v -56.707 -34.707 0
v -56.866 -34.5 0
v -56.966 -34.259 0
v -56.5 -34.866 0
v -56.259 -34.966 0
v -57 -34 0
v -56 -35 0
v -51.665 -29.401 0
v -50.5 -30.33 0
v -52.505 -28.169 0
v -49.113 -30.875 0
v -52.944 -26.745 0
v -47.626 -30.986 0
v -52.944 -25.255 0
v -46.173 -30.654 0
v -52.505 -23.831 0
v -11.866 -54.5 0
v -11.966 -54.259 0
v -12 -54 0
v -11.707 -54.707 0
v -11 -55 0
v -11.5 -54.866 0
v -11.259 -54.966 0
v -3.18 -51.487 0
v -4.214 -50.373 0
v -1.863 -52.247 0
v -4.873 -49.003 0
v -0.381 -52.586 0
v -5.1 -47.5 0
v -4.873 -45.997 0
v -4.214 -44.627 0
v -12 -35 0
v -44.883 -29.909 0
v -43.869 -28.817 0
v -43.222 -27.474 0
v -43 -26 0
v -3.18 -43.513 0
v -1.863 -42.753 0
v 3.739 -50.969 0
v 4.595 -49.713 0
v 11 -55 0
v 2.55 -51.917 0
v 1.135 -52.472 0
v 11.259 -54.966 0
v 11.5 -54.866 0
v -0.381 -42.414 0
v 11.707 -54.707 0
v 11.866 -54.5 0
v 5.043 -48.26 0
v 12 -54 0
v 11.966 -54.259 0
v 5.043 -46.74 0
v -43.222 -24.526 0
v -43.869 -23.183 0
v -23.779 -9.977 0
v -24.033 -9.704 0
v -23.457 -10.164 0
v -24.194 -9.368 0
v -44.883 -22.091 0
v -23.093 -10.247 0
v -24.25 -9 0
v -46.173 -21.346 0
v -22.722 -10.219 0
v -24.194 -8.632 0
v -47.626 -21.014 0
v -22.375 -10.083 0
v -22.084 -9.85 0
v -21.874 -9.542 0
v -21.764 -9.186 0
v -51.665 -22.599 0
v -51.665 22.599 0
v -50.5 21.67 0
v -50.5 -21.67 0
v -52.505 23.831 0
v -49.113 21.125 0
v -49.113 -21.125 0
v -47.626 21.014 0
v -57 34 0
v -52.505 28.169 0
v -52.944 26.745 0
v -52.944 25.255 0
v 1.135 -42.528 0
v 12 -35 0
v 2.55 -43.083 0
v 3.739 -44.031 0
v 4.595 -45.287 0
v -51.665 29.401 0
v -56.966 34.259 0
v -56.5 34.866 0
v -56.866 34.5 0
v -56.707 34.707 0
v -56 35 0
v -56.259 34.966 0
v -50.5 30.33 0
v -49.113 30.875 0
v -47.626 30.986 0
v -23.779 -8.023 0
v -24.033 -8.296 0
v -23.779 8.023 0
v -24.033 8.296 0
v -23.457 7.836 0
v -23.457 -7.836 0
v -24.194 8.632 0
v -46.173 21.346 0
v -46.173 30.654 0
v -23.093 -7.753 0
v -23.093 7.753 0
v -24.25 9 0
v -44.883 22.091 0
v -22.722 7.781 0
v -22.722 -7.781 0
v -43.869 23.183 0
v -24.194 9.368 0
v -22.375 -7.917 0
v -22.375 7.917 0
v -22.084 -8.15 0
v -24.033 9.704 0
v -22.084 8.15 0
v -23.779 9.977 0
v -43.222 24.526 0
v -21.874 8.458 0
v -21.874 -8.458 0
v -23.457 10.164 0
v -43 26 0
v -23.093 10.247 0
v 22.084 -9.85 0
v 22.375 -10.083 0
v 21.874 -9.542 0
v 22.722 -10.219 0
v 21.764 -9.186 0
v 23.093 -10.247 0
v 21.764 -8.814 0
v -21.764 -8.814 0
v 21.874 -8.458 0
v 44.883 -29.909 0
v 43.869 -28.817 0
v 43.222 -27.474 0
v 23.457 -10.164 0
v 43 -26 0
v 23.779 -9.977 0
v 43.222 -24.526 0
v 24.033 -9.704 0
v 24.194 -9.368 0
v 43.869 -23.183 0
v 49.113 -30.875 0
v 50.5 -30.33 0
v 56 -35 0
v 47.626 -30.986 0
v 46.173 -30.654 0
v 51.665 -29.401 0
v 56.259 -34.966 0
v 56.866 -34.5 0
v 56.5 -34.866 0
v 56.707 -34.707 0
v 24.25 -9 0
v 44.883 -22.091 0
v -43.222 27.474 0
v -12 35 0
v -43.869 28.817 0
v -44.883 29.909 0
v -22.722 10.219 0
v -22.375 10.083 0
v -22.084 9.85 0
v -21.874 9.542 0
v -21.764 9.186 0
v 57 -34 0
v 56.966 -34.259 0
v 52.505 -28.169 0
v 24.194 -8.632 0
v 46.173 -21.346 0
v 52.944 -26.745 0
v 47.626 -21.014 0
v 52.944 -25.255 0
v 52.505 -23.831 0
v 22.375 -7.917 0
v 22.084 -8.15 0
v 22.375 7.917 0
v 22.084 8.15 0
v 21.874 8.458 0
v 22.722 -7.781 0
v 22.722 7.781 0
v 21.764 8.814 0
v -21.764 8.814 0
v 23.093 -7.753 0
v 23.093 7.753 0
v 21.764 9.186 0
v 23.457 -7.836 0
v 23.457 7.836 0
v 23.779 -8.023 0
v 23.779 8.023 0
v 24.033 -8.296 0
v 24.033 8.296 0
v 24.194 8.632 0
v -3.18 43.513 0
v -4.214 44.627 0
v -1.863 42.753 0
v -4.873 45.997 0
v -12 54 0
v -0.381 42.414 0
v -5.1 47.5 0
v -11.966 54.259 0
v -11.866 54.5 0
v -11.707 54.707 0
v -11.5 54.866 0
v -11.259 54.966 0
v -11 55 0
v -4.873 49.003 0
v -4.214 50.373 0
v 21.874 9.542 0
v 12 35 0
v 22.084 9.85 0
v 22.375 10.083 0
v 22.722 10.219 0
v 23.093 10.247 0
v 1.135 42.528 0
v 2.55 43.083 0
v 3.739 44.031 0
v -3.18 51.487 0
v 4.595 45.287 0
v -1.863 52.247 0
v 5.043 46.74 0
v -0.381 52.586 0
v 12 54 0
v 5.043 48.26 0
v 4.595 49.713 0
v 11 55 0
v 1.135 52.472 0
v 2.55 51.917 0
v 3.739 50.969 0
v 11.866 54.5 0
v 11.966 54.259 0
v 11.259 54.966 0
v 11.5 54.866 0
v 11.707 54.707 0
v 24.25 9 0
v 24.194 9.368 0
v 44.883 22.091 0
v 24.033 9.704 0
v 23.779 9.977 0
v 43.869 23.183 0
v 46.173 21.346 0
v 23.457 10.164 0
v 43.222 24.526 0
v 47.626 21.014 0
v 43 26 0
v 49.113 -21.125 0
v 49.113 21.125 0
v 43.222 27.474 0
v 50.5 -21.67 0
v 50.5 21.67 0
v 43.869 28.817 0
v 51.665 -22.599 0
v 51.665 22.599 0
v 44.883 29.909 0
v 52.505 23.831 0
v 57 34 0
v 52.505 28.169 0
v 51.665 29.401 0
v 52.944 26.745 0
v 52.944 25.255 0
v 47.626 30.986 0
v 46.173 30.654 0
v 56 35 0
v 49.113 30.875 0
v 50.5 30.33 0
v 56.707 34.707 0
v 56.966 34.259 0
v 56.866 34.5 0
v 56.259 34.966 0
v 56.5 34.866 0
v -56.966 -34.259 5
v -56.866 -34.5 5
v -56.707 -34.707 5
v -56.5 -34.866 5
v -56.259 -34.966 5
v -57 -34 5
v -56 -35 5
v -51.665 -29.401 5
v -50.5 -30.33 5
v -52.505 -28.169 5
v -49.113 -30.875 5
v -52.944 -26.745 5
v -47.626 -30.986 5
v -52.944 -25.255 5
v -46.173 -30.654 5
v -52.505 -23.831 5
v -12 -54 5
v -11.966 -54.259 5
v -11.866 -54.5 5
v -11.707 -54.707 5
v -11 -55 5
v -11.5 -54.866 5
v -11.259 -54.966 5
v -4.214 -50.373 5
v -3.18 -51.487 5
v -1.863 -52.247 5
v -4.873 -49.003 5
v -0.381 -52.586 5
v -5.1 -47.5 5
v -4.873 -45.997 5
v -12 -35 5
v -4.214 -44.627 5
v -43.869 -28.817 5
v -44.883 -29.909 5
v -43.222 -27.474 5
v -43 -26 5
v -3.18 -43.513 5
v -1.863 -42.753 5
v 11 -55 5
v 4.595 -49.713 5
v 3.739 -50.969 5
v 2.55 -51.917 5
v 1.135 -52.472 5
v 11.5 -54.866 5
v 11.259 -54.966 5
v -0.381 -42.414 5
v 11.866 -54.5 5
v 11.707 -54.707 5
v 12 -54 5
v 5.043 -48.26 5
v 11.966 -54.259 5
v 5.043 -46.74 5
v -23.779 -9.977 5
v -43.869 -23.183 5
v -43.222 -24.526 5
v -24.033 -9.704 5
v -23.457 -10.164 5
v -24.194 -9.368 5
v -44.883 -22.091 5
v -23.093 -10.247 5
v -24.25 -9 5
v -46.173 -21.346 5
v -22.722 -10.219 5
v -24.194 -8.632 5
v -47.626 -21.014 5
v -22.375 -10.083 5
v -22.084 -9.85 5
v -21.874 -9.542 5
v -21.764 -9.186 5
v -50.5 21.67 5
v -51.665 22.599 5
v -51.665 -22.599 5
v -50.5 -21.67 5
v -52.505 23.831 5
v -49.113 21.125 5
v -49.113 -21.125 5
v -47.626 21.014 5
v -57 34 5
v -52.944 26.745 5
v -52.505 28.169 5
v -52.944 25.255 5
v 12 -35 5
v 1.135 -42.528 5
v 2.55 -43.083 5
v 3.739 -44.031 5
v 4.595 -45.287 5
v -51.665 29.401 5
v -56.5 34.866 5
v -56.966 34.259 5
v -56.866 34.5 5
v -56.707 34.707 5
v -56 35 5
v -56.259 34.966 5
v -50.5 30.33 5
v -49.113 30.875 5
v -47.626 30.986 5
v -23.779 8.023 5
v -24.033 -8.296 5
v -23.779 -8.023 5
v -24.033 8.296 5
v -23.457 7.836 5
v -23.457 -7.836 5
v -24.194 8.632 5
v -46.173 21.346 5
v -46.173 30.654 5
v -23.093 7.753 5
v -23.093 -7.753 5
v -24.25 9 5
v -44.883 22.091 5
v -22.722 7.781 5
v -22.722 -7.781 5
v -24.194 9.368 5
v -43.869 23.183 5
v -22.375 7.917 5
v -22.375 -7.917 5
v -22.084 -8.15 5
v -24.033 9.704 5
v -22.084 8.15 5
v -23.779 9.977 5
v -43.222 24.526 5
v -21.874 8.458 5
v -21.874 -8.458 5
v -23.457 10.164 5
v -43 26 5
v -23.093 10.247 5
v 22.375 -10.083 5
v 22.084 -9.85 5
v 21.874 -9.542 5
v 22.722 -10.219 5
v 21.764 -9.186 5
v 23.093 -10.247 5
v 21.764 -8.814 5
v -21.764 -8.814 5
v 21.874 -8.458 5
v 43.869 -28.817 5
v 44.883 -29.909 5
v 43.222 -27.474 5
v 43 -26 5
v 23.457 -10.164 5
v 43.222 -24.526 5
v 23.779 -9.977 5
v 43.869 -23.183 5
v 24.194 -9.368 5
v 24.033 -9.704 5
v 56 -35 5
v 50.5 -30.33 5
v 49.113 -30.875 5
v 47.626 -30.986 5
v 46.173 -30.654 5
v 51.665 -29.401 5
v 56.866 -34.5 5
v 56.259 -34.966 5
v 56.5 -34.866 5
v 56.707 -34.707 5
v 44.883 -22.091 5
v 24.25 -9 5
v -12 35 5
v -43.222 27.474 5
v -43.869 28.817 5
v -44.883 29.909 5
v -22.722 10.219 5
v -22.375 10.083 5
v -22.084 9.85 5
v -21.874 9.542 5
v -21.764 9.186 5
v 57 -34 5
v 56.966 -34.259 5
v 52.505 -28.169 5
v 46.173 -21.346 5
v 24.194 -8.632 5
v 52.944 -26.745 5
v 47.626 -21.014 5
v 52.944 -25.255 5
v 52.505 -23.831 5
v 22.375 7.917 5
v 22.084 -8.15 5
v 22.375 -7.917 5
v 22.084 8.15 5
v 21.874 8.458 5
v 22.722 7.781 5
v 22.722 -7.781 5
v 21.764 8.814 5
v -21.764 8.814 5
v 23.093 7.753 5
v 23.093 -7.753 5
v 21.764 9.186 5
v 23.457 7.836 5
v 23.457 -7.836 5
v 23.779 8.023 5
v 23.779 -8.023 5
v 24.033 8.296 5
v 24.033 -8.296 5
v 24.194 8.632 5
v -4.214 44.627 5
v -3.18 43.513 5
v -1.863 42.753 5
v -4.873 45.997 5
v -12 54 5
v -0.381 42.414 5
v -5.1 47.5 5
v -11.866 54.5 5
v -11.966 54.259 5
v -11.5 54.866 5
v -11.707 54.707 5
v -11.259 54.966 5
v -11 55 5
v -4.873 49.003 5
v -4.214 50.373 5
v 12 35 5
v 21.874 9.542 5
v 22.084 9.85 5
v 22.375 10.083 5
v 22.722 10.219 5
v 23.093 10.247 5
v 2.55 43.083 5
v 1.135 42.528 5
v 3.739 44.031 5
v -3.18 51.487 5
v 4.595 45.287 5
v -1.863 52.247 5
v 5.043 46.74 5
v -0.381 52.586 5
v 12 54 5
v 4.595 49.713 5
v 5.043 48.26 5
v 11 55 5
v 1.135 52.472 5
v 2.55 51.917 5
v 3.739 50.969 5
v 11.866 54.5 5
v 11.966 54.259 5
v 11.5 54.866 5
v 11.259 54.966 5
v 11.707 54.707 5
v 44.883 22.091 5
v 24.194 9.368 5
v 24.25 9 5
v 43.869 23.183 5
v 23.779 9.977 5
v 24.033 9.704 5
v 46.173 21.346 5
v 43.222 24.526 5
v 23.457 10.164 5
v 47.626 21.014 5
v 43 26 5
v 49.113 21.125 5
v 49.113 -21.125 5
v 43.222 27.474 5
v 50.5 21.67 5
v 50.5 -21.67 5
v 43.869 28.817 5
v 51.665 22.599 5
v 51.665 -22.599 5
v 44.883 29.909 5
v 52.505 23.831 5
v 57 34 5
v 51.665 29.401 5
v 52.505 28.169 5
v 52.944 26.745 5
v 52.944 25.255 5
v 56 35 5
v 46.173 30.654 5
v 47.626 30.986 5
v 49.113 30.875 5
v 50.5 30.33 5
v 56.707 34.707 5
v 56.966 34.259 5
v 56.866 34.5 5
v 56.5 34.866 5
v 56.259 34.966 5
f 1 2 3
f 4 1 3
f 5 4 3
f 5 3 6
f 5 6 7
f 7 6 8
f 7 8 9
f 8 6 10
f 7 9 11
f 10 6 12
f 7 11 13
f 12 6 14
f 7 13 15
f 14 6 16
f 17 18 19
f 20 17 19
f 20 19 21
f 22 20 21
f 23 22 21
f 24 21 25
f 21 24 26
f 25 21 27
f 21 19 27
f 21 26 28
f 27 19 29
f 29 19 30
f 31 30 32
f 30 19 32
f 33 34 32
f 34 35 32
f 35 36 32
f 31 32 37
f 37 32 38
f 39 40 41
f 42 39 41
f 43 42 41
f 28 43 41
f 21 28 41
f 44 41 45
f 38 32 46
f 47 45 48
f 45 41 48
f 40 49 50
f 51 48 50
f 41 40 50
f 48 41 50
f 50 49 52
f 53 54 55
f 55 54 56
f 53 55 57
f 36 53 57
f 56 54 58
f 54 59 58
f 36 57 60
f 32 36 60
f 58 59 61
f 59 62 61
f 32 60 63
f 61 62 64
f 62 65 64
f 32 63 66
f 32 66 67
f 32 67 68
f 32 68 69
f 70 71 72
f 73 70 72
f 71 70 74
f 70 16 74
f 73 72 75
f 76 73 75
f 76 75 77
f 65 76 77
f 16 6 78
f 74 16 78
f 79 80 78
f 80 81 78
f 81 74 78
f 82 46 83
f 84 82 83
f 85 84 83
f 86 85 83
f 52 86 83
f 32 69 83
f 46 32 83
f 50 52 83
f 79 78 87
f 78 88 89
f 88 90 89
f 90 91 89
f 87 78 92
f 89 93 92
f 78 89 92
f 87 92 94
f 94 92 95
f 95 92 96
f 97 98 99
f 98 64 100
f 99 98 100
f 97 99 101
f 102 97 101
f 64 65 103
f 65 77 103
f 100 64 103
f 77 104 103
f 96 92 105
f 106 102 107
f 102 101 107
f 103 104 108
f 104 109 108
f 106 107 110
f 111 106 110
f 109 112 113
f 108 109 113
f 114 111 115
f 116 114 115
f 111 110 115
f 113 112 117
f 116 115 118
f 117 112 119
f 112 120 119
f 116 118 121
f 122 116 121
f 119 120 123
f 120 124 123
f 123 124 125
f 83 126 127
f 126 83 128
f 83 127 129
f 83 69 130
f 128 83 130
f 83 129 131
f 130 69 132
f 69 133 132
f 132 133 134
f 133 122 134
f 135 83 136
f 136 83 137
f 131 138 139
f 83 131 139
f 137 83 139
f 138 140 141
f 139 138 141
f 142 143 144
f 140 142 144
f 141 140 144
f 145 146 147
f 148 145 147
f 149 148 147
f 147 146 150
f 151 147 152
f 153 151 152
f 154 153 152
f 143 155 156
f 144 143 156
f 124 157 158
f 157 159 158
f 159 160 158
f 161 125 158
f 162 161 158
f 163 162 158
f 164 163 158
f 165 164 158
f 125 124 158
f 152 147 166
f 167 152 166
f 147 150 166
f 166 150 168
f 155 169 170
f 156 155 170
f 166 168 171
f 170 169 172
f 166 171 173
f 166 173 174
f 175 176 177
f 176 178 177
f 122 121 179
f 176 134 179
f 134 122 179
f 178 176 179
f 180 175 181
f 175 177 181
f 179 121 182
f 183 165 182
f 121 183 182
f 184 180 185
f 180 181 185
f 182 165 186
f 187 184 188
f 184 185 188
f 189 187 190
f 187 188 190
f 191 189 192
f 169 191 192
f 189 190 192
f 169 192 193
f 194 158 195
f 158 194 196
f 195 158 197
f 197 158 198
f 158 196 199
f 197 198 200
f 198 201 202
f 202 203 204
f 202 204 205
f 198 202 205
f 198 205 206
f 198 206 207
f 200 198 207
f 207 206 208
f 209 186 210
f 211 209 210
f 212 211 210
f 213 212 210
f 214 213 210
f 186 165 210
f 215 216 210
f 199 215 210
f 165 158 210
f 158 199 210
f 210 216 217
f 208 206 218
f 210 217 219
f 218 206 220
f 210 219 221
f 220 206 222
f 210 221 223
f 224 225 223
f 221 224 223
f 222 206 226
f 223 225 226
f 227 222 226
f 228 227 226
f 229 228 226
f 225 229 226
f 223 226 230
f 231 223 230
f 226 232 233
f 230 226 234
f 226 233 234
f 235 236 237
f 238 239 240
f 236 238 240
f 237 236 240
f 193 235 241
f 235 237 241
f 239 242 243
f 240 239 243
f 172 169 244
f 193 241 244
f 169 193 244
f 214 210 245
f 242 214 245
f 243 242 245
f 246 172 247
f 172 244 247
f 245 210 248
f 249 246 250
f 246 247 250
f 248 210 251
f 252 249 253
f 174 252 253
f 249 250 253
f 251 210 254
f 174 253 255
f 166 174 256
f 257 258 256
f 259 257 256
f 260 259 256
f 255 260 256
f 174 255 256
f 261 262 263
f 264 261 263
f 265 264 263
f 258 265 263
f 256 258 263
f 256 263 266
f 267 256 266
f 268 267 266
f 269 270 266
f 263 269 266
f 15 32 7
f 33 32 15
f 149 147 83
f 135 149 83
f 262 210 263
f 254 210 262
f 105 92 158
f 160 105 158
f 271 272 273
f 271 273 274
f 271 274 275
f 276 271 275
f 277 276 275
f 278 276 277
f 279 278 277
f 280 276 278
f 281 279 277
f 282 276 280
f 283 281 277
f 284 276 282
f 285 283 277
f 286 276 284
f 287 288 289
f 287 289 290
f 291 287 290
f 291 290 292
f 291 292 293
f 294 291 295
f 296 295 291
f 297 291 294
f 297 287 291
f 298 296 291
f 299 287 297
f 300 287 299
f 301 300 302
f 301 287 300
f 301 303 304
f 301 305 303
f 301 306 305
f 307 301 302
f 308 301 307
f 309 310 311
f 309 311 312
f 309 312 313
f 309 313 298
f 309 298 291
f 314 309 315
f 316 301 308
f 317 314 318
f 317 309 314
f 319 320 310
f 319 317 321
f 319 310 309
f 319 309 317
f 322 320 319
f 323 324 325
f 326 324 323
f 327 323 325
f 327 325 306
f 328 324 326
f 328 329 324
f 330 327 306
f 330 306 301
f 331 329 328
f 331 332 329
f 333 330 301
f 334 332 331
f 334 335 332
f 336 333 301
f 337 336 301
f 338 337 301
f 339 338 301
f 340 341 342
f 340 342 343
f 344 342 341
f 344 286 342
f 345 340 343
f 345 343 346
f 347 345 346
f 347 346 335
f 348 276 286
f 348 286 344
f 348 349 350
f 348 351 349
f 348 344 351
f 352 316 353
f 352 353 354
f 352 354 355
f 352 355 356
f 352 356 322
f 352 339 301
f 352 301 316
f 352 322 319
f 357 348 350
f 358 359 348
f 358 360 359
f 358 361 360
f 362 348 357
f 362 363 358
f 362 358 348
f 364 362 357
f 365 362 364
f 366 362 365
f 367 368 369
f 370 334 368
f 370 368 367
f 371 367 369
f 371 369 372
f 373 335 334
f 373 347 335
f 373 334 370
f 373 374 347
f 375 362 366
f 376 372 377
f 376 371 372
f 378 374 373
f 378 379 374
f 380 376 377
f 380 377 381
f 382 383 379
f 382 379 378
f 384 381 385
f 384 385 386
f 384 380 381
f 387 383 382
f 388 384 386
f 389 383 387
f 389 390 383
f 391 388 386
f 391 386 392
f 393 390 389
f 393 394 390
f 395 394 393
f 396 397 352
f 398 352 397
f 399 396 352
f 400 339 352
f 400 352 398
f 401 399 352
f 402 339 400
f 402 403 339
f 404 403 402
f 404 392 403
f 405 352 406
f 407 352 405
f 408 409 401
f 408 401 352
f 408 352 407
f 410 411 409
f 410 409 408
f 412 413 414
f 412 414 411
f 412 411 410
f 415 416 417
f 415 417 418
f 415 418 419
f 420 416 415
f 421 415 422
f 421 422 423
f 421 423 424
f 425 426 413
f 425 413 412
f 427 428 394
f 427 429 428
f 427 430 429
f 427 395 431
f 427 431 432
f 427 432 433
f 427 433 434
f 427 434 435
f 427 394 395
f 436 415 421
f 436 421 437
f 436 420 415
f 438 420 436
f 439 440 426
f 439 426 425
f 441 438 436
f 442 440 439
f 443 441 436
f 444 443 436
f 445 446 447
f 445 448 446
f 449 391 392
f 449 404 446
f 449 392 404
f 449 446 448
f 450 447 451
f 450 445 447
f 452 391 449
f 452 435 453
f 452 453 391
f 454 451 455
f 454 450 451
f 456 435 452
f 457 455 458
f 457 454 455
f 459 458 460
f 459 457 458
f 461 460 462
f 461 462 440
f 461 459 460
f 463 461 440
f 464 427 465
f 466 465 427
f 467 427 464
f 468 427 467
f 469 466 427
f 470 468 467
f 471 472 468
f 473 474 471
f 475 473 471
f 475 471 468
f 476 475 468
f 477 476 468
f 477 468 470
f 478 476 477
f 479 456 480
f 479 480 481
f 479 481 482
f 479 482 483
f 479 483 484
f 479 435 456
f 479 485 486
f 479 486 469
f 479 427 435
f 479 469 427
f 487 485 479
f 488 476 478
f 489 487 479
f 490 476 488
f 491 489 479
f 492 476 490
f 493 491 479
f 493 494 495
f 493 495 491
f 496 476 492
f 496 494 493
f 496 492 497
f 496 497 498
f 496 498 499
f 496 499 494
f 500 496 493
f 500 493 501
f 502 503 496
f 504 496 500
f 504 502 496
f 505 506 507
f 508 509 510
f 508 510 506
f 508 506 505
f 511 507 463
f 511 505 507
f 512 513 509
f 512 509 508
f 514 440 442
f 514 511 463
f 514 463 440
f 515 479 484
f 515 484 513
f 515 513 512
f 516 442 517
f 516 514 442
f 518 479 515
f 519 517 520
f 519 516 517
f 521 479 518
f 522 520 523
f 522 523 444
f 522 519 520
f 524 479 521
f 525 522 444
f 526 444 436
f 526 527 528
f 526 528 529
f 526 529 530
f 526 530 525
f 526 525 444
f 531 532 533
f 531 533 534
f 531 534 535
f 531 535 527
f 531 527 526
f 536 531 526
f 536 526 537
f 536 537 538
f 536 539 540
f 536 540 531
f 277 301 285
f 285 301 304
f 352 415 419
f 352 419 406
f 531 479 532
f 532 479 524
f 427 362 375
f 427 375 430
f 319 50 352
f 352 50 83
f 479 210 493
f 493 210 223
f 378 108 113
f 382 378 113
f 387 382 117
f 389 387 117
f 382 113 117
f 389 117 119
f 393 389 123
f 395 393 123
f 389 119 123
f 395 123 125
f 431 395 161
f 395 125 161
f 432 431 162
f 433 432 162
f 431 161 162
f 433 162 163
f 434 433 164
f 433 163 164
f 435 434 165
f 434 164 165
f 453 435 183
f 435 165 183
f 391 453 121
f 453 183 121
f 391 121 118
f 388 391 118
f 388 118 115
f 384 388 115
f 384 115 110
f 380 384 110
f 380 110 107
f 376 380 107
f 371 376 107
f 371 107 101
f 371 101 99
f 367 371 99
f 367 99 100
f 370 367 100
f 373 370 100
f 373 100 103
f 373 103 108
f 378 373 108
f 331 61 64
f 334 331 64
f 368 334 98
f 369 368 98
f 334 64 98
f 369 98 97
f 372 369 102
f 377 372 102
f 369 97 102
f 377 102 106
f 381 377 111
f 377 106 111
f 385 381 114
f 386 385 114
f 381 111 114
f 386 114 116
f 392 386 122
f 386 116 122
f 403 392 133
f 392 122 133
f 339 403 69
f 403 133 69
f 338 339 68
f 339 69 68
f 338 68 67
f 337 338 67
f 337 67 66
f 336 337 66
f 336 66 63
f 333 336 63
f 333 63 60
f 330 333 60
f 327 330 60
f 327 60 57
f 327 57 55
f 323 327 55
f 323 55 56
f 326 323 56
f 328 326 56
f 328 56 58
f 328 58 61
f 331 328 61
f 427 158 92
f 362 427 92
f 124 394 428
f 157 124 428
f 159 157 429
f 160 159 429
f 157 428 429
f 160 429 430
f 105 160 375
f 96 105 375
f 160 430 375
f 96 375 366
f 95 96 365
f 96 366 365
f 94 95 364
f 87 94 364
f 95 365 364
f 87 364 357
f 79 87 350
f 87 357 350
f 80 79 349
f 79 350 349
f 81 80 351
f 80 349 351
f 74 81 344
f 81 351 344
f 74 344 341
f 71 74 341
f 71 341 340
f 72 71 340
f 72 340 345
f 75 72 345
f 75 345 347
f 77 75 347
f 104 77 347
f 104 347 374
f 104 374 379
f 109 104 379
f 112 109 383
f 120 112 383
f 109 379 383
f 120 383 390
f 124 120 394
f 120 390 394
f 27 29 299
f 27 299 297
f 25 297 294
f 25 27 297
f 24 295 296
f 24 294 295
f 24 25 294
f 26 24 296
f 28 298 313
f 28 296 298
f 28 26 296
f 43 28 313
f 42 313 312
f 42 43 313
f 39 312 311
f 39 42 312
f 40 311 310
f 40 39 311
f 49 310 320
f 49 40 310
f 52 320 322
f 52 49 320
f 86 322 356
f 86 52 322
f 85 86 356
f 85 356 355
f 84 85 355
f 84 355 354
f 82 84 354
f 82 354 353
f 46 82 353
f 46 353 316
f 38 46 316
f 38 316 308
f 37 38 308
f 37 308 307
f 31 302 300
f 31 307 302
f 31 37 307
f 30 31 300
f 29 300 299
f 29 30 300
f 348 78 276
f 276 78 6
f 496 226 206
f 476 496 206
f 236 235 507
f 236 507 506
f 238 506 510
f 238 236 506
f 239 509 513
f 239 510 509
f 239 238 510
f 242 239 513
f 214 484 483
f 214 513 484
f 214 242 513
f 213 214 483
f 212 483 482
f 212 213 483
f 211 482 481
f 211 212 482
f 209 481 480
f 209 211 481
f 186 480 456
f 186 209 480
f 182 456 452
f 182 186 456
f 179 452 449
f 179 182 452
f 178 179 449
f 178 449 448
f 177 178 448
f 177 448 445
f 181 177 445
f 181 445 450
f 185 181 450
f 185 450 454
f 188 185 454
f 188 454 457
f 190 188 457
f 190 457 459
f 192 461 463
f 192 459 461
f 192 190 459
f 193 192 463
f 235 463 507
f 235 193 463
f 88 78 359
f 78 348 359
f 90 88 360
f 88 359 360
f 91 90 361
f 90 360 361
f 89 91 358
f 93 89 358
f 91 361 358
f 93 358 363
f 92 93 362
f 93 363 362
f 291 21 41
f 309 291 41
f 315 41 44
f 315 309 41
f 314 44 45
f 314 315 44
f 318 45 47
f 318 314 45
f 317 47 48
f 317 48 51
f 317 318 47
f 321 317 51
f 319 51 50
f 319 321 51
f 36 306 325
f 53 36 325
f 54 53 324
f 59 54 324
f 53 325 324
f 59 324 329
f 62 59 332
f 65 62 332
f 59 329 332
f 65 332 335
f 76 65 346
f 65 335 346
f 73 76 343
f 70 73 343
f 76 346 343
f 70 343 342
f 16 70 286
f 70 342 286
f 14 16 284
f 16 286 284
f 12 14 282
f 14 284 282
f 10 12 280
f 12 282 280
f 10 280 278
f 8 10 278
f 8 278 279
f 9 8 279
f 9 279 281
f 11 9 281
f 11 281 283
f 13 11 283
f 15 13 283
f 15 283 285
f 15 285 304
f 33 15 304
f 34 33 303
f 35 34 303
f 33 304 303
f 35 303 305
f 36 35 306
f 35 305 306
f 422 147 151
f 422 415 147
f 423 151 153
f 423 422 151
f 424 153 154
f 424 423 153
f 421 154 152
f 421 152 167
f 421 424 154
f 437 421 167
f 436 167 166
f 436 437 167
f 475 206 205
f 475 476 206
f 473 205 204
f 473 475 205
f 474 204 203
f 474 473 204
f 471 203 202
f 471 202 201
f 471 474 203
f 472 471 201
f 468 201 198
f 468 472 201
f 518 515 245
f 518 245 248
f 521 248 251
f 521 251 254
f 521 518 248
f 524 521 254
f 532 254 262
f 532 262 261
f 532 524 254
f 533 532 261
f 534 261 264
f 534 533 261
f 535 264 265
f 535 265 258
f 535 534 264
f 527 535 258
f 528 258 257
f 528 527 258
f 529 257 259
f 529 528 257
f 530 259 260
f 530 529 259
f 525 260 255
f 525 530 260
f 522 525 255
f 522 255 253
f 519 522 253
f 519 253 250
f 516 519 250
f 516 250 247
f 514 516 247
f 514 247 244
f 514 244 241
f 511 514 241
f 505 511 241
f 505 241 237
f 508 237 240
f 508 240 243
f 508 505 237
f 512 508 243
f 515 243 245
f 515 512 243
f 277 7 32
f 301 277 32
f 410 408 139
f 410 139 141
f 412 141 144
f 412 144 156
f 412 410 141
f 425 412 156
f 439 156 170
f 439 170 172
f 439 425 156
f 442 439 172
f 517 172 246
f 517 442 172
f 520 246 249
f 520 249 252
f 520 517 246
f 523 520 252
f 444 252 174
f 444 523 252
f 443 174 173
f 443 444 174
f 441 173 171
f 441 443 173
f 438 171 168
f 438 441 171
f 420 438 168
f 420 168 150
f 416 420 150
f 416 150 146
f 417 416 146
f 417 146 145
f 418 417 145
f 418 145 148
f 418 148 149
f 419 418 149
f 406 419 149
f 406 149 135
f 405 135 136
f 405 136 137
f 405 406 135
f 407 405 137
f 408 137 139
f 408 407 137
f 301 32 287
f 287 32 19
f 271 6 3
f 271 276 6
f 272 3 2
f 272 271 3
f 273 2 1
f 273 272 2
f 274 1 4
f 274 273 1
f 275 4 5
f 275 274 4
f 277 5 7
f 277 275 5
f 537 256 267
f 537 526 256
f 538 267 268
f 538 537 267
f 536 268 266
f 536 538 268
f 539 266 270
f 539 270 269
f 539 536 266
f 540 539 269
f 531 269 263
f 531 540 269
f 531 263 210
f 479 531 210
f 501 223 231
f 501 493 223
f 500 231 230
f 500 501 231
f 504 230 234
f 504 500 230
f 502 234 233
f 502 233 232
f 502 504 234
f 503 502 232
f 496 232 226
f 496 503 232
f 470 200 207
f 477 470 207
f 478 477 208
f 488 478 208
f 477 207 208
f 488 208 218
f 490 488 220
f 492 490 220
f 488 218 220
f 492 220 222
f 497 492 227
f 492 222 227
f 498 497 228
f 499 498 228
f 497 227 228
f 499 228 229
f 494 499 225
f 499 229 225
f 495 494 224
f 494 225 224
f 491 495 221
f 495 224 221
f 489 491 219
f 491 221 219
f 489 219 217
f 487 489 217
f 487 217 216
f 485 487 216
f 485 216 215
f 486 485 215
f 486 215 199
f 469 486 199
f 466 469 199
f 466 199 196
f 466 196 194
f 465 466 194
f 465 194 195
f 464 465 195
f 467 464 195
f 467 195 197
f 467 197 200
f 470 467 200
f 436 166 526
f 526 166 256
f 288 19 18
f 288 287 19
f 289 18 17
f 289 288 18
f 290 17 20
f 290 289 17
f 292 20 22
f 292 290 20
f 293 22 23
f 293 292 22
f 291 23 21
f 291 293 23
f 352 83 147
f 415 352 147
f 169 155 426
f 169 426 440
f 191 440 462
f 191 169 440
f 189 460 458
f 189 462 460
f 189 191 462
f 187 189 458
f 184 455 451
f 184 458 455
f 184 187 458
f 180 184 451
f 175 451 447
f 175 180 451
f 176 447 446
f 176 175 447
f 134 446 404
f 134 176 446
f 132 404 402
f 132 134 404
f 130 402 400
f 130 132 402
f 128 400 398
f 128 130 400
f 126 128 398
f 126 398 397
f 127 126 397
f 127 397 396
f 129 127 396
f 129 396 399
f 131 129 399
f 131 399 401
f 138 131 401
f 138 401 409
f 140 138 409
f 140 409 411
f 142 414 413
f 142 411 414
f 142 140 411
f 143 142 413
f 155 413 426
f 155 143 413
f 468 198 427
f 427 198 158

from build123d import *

# Parameters (mm, degrees)
EXTRUDE_1_DEPTH     = 5
FILLET_2_R          = 1
HOLE_WIZARD_M3_1_D  = 2.5
SKETCH_5_R          = 5
CUT_EXTRUDE_1_DEPTH = 5
HOLE_WIZARD_M12_1_D = 10.2


with BuildPart() as part:
    # 草图1 → 凸台-拉伸1 (new body)
    with BuildSketch(Plane.XY):
        Polygon((-57, 35), (-57, -35), (-12, -35), (-12, -55), (12, -55), (12, -35), (57, -35), (57, 35), (12, 35), (12, 55), (-12, 55), (-12, 35), align=None)
    extrude(amount=EXTRUDE_1_DEPTH)

    # 圆角2
    fillet_2_edges = [part.edges().sort_by_distance(p)[0] for p in [
        (-12, 55, 2.5),
        (12, 55, 2.5),
        (57, 35, 2.5),
        (57, -35, 2.5),
        (12, -55, 2.5),
        (-12, -55, 2.5),
        (-57, -35, 2.5),
        (-57, 35, 2.5),
    ]]
    fillet(fillet_2_edges, radius=FILLET_2_R)

    # M3 螺纹孔的螺纹孔钻头1 (through all)
    with Locations(Plane(origin=(-23, 9, 5), x_dir=(1, 0, 0), z_dir=(0, 0, 1))):
        with Locations((0, 0), (0, -18)):
            hole_wizard_m3_1 = Hole(HOLE_WIZARD_M3_1_D / 2)

    # 镜向1: M3 螺纹孔的螺纹孔钻头1 across plane
    add(hole_wizard_m3_1.mirror(Plane(origin=(0, 0, 0), x_dir=(0, 0, 1), z_dir=(1, 0, 0))), mode=Mode.SUBTRACT)

    # 草图5 → 切除-拉伸1 (cut)
    with BuildSketch(Plane.XY.offset(5)):
        with Locations((-48, 26)):
            Circle(SKETCH_5_R)
        with Locations((-48, -26)):
            Circle(SKETCH_5_R)
    cut_extrude_1 = extrude(amount=-CUT_EXTRUDE_1_DEPTH, mode=Mode.SUBTRACT)

    # 镜向2: 切除-拉伸1 across plane
    add(cut_extrude_1.mirror(Plane(origin=(0, 0, 0), x_dir=(0, 0, 1), z_dir=(1, 0, 0))), mode=Mode.SUBTRACT)

    # M12 螺纹孔的螺纹孔钻头1 (through all)
    with Locations(Plane(origin=(0, 47.5, 5), x_dir=(1, 0, 0), z_dir=(0, 0, 1))):
        with Locations((0, 0)):
            hole_wizard_m12_1 = Hole(HOLE_WIZARD_M12_1_D / 2)

    # 镜向3: M12 螺纹孔的螺纹孔钻头1 across plane
    add(hole_wizard_m12_1.mirror(Plane.ZX), mode=Mode.SUBTRACT)


solid = part.part
